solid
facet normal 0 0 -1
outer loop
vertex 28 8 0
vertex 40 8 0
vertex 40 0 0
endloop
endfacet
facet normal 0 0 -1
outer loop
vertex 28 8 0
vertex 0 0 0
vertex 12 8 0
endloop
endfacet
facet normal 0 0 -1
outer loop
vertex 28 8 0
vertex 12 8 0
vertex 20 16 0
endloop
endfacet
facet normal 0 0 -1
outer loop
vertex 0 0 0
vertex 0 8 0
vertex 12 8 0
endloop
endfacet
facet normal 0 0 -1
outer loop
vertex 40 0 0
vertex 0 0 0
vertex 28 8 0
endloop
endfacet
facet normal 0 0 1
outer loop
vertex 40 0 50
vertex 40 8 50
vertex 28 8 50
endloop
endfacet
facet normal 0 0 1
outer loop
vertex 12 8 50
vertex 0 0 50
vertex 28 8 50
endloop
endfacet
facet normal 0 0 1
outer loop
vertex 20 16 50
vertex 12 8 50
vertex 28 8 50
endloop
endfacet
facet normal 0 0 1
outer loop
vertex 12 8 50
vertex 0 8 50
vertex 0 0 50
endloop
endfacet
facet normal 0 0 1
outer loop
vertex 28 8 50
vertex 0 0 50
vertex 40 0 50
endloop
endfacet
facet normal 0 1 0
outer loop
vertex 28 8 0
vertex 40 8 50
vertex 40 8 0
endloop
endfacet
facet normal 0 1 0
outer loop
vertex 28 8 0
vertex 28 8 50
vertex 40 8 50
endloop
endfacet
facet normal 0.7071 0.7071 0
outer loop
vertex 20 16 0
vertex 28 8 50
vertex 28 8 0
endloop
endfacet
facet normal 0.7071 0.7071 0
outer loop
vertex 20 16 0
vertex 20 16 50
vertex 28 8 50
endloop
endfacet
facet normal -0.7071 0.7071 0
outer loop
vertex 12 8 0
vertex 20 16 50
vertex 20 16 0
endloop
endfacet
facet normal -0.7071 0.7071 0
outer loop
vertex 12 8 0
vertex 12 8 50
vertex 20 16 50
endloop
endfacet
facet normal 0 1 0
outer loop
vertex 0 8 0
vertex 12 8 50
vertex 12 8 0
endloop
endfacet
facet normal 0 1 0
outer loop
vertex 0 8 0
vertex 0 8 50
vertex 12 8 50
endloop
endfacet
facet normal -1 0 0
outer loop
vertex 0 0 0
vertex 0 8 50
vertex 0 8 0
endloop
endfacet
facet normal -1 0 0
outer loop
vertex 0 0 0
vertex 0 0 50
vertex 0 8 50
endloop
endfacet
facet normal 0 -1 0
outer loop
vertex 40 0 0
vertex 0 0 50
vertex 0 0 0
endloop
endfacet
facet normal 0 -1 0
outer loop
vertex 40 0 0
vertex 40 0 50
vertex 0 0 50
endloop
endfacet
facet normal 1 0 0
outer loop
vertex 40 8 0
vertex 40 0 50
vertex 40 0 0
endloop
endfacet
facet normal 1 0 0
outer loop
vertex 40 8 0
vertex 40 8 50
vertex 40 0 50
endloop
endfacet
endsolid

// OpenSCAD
$fn = 32;

// ----------------------------------------------------------------------
// V guide rail: vrib, 40 mm wide
// ----------------------------------------------------------------------

// --- parameters (mm) ---
rail_w = 40;              // rail width, X
base_t = 8;               // base plate thickness
v_depth = 8;              // V feature depth / height
v_half_w = 8;             // half width of the V at the base face
plate_t = 50;             // rail length, Z (the extrusion height)

profile = [[0, 0], [40, 0], [40, 8], [28, 8], [20, 16], [12, 8], [0, 8]];  // primary outline, 7 points, counter clockwise

// --- the one profile operation ---
linear_extrude(height = plate_t) polygon(points = profile);
